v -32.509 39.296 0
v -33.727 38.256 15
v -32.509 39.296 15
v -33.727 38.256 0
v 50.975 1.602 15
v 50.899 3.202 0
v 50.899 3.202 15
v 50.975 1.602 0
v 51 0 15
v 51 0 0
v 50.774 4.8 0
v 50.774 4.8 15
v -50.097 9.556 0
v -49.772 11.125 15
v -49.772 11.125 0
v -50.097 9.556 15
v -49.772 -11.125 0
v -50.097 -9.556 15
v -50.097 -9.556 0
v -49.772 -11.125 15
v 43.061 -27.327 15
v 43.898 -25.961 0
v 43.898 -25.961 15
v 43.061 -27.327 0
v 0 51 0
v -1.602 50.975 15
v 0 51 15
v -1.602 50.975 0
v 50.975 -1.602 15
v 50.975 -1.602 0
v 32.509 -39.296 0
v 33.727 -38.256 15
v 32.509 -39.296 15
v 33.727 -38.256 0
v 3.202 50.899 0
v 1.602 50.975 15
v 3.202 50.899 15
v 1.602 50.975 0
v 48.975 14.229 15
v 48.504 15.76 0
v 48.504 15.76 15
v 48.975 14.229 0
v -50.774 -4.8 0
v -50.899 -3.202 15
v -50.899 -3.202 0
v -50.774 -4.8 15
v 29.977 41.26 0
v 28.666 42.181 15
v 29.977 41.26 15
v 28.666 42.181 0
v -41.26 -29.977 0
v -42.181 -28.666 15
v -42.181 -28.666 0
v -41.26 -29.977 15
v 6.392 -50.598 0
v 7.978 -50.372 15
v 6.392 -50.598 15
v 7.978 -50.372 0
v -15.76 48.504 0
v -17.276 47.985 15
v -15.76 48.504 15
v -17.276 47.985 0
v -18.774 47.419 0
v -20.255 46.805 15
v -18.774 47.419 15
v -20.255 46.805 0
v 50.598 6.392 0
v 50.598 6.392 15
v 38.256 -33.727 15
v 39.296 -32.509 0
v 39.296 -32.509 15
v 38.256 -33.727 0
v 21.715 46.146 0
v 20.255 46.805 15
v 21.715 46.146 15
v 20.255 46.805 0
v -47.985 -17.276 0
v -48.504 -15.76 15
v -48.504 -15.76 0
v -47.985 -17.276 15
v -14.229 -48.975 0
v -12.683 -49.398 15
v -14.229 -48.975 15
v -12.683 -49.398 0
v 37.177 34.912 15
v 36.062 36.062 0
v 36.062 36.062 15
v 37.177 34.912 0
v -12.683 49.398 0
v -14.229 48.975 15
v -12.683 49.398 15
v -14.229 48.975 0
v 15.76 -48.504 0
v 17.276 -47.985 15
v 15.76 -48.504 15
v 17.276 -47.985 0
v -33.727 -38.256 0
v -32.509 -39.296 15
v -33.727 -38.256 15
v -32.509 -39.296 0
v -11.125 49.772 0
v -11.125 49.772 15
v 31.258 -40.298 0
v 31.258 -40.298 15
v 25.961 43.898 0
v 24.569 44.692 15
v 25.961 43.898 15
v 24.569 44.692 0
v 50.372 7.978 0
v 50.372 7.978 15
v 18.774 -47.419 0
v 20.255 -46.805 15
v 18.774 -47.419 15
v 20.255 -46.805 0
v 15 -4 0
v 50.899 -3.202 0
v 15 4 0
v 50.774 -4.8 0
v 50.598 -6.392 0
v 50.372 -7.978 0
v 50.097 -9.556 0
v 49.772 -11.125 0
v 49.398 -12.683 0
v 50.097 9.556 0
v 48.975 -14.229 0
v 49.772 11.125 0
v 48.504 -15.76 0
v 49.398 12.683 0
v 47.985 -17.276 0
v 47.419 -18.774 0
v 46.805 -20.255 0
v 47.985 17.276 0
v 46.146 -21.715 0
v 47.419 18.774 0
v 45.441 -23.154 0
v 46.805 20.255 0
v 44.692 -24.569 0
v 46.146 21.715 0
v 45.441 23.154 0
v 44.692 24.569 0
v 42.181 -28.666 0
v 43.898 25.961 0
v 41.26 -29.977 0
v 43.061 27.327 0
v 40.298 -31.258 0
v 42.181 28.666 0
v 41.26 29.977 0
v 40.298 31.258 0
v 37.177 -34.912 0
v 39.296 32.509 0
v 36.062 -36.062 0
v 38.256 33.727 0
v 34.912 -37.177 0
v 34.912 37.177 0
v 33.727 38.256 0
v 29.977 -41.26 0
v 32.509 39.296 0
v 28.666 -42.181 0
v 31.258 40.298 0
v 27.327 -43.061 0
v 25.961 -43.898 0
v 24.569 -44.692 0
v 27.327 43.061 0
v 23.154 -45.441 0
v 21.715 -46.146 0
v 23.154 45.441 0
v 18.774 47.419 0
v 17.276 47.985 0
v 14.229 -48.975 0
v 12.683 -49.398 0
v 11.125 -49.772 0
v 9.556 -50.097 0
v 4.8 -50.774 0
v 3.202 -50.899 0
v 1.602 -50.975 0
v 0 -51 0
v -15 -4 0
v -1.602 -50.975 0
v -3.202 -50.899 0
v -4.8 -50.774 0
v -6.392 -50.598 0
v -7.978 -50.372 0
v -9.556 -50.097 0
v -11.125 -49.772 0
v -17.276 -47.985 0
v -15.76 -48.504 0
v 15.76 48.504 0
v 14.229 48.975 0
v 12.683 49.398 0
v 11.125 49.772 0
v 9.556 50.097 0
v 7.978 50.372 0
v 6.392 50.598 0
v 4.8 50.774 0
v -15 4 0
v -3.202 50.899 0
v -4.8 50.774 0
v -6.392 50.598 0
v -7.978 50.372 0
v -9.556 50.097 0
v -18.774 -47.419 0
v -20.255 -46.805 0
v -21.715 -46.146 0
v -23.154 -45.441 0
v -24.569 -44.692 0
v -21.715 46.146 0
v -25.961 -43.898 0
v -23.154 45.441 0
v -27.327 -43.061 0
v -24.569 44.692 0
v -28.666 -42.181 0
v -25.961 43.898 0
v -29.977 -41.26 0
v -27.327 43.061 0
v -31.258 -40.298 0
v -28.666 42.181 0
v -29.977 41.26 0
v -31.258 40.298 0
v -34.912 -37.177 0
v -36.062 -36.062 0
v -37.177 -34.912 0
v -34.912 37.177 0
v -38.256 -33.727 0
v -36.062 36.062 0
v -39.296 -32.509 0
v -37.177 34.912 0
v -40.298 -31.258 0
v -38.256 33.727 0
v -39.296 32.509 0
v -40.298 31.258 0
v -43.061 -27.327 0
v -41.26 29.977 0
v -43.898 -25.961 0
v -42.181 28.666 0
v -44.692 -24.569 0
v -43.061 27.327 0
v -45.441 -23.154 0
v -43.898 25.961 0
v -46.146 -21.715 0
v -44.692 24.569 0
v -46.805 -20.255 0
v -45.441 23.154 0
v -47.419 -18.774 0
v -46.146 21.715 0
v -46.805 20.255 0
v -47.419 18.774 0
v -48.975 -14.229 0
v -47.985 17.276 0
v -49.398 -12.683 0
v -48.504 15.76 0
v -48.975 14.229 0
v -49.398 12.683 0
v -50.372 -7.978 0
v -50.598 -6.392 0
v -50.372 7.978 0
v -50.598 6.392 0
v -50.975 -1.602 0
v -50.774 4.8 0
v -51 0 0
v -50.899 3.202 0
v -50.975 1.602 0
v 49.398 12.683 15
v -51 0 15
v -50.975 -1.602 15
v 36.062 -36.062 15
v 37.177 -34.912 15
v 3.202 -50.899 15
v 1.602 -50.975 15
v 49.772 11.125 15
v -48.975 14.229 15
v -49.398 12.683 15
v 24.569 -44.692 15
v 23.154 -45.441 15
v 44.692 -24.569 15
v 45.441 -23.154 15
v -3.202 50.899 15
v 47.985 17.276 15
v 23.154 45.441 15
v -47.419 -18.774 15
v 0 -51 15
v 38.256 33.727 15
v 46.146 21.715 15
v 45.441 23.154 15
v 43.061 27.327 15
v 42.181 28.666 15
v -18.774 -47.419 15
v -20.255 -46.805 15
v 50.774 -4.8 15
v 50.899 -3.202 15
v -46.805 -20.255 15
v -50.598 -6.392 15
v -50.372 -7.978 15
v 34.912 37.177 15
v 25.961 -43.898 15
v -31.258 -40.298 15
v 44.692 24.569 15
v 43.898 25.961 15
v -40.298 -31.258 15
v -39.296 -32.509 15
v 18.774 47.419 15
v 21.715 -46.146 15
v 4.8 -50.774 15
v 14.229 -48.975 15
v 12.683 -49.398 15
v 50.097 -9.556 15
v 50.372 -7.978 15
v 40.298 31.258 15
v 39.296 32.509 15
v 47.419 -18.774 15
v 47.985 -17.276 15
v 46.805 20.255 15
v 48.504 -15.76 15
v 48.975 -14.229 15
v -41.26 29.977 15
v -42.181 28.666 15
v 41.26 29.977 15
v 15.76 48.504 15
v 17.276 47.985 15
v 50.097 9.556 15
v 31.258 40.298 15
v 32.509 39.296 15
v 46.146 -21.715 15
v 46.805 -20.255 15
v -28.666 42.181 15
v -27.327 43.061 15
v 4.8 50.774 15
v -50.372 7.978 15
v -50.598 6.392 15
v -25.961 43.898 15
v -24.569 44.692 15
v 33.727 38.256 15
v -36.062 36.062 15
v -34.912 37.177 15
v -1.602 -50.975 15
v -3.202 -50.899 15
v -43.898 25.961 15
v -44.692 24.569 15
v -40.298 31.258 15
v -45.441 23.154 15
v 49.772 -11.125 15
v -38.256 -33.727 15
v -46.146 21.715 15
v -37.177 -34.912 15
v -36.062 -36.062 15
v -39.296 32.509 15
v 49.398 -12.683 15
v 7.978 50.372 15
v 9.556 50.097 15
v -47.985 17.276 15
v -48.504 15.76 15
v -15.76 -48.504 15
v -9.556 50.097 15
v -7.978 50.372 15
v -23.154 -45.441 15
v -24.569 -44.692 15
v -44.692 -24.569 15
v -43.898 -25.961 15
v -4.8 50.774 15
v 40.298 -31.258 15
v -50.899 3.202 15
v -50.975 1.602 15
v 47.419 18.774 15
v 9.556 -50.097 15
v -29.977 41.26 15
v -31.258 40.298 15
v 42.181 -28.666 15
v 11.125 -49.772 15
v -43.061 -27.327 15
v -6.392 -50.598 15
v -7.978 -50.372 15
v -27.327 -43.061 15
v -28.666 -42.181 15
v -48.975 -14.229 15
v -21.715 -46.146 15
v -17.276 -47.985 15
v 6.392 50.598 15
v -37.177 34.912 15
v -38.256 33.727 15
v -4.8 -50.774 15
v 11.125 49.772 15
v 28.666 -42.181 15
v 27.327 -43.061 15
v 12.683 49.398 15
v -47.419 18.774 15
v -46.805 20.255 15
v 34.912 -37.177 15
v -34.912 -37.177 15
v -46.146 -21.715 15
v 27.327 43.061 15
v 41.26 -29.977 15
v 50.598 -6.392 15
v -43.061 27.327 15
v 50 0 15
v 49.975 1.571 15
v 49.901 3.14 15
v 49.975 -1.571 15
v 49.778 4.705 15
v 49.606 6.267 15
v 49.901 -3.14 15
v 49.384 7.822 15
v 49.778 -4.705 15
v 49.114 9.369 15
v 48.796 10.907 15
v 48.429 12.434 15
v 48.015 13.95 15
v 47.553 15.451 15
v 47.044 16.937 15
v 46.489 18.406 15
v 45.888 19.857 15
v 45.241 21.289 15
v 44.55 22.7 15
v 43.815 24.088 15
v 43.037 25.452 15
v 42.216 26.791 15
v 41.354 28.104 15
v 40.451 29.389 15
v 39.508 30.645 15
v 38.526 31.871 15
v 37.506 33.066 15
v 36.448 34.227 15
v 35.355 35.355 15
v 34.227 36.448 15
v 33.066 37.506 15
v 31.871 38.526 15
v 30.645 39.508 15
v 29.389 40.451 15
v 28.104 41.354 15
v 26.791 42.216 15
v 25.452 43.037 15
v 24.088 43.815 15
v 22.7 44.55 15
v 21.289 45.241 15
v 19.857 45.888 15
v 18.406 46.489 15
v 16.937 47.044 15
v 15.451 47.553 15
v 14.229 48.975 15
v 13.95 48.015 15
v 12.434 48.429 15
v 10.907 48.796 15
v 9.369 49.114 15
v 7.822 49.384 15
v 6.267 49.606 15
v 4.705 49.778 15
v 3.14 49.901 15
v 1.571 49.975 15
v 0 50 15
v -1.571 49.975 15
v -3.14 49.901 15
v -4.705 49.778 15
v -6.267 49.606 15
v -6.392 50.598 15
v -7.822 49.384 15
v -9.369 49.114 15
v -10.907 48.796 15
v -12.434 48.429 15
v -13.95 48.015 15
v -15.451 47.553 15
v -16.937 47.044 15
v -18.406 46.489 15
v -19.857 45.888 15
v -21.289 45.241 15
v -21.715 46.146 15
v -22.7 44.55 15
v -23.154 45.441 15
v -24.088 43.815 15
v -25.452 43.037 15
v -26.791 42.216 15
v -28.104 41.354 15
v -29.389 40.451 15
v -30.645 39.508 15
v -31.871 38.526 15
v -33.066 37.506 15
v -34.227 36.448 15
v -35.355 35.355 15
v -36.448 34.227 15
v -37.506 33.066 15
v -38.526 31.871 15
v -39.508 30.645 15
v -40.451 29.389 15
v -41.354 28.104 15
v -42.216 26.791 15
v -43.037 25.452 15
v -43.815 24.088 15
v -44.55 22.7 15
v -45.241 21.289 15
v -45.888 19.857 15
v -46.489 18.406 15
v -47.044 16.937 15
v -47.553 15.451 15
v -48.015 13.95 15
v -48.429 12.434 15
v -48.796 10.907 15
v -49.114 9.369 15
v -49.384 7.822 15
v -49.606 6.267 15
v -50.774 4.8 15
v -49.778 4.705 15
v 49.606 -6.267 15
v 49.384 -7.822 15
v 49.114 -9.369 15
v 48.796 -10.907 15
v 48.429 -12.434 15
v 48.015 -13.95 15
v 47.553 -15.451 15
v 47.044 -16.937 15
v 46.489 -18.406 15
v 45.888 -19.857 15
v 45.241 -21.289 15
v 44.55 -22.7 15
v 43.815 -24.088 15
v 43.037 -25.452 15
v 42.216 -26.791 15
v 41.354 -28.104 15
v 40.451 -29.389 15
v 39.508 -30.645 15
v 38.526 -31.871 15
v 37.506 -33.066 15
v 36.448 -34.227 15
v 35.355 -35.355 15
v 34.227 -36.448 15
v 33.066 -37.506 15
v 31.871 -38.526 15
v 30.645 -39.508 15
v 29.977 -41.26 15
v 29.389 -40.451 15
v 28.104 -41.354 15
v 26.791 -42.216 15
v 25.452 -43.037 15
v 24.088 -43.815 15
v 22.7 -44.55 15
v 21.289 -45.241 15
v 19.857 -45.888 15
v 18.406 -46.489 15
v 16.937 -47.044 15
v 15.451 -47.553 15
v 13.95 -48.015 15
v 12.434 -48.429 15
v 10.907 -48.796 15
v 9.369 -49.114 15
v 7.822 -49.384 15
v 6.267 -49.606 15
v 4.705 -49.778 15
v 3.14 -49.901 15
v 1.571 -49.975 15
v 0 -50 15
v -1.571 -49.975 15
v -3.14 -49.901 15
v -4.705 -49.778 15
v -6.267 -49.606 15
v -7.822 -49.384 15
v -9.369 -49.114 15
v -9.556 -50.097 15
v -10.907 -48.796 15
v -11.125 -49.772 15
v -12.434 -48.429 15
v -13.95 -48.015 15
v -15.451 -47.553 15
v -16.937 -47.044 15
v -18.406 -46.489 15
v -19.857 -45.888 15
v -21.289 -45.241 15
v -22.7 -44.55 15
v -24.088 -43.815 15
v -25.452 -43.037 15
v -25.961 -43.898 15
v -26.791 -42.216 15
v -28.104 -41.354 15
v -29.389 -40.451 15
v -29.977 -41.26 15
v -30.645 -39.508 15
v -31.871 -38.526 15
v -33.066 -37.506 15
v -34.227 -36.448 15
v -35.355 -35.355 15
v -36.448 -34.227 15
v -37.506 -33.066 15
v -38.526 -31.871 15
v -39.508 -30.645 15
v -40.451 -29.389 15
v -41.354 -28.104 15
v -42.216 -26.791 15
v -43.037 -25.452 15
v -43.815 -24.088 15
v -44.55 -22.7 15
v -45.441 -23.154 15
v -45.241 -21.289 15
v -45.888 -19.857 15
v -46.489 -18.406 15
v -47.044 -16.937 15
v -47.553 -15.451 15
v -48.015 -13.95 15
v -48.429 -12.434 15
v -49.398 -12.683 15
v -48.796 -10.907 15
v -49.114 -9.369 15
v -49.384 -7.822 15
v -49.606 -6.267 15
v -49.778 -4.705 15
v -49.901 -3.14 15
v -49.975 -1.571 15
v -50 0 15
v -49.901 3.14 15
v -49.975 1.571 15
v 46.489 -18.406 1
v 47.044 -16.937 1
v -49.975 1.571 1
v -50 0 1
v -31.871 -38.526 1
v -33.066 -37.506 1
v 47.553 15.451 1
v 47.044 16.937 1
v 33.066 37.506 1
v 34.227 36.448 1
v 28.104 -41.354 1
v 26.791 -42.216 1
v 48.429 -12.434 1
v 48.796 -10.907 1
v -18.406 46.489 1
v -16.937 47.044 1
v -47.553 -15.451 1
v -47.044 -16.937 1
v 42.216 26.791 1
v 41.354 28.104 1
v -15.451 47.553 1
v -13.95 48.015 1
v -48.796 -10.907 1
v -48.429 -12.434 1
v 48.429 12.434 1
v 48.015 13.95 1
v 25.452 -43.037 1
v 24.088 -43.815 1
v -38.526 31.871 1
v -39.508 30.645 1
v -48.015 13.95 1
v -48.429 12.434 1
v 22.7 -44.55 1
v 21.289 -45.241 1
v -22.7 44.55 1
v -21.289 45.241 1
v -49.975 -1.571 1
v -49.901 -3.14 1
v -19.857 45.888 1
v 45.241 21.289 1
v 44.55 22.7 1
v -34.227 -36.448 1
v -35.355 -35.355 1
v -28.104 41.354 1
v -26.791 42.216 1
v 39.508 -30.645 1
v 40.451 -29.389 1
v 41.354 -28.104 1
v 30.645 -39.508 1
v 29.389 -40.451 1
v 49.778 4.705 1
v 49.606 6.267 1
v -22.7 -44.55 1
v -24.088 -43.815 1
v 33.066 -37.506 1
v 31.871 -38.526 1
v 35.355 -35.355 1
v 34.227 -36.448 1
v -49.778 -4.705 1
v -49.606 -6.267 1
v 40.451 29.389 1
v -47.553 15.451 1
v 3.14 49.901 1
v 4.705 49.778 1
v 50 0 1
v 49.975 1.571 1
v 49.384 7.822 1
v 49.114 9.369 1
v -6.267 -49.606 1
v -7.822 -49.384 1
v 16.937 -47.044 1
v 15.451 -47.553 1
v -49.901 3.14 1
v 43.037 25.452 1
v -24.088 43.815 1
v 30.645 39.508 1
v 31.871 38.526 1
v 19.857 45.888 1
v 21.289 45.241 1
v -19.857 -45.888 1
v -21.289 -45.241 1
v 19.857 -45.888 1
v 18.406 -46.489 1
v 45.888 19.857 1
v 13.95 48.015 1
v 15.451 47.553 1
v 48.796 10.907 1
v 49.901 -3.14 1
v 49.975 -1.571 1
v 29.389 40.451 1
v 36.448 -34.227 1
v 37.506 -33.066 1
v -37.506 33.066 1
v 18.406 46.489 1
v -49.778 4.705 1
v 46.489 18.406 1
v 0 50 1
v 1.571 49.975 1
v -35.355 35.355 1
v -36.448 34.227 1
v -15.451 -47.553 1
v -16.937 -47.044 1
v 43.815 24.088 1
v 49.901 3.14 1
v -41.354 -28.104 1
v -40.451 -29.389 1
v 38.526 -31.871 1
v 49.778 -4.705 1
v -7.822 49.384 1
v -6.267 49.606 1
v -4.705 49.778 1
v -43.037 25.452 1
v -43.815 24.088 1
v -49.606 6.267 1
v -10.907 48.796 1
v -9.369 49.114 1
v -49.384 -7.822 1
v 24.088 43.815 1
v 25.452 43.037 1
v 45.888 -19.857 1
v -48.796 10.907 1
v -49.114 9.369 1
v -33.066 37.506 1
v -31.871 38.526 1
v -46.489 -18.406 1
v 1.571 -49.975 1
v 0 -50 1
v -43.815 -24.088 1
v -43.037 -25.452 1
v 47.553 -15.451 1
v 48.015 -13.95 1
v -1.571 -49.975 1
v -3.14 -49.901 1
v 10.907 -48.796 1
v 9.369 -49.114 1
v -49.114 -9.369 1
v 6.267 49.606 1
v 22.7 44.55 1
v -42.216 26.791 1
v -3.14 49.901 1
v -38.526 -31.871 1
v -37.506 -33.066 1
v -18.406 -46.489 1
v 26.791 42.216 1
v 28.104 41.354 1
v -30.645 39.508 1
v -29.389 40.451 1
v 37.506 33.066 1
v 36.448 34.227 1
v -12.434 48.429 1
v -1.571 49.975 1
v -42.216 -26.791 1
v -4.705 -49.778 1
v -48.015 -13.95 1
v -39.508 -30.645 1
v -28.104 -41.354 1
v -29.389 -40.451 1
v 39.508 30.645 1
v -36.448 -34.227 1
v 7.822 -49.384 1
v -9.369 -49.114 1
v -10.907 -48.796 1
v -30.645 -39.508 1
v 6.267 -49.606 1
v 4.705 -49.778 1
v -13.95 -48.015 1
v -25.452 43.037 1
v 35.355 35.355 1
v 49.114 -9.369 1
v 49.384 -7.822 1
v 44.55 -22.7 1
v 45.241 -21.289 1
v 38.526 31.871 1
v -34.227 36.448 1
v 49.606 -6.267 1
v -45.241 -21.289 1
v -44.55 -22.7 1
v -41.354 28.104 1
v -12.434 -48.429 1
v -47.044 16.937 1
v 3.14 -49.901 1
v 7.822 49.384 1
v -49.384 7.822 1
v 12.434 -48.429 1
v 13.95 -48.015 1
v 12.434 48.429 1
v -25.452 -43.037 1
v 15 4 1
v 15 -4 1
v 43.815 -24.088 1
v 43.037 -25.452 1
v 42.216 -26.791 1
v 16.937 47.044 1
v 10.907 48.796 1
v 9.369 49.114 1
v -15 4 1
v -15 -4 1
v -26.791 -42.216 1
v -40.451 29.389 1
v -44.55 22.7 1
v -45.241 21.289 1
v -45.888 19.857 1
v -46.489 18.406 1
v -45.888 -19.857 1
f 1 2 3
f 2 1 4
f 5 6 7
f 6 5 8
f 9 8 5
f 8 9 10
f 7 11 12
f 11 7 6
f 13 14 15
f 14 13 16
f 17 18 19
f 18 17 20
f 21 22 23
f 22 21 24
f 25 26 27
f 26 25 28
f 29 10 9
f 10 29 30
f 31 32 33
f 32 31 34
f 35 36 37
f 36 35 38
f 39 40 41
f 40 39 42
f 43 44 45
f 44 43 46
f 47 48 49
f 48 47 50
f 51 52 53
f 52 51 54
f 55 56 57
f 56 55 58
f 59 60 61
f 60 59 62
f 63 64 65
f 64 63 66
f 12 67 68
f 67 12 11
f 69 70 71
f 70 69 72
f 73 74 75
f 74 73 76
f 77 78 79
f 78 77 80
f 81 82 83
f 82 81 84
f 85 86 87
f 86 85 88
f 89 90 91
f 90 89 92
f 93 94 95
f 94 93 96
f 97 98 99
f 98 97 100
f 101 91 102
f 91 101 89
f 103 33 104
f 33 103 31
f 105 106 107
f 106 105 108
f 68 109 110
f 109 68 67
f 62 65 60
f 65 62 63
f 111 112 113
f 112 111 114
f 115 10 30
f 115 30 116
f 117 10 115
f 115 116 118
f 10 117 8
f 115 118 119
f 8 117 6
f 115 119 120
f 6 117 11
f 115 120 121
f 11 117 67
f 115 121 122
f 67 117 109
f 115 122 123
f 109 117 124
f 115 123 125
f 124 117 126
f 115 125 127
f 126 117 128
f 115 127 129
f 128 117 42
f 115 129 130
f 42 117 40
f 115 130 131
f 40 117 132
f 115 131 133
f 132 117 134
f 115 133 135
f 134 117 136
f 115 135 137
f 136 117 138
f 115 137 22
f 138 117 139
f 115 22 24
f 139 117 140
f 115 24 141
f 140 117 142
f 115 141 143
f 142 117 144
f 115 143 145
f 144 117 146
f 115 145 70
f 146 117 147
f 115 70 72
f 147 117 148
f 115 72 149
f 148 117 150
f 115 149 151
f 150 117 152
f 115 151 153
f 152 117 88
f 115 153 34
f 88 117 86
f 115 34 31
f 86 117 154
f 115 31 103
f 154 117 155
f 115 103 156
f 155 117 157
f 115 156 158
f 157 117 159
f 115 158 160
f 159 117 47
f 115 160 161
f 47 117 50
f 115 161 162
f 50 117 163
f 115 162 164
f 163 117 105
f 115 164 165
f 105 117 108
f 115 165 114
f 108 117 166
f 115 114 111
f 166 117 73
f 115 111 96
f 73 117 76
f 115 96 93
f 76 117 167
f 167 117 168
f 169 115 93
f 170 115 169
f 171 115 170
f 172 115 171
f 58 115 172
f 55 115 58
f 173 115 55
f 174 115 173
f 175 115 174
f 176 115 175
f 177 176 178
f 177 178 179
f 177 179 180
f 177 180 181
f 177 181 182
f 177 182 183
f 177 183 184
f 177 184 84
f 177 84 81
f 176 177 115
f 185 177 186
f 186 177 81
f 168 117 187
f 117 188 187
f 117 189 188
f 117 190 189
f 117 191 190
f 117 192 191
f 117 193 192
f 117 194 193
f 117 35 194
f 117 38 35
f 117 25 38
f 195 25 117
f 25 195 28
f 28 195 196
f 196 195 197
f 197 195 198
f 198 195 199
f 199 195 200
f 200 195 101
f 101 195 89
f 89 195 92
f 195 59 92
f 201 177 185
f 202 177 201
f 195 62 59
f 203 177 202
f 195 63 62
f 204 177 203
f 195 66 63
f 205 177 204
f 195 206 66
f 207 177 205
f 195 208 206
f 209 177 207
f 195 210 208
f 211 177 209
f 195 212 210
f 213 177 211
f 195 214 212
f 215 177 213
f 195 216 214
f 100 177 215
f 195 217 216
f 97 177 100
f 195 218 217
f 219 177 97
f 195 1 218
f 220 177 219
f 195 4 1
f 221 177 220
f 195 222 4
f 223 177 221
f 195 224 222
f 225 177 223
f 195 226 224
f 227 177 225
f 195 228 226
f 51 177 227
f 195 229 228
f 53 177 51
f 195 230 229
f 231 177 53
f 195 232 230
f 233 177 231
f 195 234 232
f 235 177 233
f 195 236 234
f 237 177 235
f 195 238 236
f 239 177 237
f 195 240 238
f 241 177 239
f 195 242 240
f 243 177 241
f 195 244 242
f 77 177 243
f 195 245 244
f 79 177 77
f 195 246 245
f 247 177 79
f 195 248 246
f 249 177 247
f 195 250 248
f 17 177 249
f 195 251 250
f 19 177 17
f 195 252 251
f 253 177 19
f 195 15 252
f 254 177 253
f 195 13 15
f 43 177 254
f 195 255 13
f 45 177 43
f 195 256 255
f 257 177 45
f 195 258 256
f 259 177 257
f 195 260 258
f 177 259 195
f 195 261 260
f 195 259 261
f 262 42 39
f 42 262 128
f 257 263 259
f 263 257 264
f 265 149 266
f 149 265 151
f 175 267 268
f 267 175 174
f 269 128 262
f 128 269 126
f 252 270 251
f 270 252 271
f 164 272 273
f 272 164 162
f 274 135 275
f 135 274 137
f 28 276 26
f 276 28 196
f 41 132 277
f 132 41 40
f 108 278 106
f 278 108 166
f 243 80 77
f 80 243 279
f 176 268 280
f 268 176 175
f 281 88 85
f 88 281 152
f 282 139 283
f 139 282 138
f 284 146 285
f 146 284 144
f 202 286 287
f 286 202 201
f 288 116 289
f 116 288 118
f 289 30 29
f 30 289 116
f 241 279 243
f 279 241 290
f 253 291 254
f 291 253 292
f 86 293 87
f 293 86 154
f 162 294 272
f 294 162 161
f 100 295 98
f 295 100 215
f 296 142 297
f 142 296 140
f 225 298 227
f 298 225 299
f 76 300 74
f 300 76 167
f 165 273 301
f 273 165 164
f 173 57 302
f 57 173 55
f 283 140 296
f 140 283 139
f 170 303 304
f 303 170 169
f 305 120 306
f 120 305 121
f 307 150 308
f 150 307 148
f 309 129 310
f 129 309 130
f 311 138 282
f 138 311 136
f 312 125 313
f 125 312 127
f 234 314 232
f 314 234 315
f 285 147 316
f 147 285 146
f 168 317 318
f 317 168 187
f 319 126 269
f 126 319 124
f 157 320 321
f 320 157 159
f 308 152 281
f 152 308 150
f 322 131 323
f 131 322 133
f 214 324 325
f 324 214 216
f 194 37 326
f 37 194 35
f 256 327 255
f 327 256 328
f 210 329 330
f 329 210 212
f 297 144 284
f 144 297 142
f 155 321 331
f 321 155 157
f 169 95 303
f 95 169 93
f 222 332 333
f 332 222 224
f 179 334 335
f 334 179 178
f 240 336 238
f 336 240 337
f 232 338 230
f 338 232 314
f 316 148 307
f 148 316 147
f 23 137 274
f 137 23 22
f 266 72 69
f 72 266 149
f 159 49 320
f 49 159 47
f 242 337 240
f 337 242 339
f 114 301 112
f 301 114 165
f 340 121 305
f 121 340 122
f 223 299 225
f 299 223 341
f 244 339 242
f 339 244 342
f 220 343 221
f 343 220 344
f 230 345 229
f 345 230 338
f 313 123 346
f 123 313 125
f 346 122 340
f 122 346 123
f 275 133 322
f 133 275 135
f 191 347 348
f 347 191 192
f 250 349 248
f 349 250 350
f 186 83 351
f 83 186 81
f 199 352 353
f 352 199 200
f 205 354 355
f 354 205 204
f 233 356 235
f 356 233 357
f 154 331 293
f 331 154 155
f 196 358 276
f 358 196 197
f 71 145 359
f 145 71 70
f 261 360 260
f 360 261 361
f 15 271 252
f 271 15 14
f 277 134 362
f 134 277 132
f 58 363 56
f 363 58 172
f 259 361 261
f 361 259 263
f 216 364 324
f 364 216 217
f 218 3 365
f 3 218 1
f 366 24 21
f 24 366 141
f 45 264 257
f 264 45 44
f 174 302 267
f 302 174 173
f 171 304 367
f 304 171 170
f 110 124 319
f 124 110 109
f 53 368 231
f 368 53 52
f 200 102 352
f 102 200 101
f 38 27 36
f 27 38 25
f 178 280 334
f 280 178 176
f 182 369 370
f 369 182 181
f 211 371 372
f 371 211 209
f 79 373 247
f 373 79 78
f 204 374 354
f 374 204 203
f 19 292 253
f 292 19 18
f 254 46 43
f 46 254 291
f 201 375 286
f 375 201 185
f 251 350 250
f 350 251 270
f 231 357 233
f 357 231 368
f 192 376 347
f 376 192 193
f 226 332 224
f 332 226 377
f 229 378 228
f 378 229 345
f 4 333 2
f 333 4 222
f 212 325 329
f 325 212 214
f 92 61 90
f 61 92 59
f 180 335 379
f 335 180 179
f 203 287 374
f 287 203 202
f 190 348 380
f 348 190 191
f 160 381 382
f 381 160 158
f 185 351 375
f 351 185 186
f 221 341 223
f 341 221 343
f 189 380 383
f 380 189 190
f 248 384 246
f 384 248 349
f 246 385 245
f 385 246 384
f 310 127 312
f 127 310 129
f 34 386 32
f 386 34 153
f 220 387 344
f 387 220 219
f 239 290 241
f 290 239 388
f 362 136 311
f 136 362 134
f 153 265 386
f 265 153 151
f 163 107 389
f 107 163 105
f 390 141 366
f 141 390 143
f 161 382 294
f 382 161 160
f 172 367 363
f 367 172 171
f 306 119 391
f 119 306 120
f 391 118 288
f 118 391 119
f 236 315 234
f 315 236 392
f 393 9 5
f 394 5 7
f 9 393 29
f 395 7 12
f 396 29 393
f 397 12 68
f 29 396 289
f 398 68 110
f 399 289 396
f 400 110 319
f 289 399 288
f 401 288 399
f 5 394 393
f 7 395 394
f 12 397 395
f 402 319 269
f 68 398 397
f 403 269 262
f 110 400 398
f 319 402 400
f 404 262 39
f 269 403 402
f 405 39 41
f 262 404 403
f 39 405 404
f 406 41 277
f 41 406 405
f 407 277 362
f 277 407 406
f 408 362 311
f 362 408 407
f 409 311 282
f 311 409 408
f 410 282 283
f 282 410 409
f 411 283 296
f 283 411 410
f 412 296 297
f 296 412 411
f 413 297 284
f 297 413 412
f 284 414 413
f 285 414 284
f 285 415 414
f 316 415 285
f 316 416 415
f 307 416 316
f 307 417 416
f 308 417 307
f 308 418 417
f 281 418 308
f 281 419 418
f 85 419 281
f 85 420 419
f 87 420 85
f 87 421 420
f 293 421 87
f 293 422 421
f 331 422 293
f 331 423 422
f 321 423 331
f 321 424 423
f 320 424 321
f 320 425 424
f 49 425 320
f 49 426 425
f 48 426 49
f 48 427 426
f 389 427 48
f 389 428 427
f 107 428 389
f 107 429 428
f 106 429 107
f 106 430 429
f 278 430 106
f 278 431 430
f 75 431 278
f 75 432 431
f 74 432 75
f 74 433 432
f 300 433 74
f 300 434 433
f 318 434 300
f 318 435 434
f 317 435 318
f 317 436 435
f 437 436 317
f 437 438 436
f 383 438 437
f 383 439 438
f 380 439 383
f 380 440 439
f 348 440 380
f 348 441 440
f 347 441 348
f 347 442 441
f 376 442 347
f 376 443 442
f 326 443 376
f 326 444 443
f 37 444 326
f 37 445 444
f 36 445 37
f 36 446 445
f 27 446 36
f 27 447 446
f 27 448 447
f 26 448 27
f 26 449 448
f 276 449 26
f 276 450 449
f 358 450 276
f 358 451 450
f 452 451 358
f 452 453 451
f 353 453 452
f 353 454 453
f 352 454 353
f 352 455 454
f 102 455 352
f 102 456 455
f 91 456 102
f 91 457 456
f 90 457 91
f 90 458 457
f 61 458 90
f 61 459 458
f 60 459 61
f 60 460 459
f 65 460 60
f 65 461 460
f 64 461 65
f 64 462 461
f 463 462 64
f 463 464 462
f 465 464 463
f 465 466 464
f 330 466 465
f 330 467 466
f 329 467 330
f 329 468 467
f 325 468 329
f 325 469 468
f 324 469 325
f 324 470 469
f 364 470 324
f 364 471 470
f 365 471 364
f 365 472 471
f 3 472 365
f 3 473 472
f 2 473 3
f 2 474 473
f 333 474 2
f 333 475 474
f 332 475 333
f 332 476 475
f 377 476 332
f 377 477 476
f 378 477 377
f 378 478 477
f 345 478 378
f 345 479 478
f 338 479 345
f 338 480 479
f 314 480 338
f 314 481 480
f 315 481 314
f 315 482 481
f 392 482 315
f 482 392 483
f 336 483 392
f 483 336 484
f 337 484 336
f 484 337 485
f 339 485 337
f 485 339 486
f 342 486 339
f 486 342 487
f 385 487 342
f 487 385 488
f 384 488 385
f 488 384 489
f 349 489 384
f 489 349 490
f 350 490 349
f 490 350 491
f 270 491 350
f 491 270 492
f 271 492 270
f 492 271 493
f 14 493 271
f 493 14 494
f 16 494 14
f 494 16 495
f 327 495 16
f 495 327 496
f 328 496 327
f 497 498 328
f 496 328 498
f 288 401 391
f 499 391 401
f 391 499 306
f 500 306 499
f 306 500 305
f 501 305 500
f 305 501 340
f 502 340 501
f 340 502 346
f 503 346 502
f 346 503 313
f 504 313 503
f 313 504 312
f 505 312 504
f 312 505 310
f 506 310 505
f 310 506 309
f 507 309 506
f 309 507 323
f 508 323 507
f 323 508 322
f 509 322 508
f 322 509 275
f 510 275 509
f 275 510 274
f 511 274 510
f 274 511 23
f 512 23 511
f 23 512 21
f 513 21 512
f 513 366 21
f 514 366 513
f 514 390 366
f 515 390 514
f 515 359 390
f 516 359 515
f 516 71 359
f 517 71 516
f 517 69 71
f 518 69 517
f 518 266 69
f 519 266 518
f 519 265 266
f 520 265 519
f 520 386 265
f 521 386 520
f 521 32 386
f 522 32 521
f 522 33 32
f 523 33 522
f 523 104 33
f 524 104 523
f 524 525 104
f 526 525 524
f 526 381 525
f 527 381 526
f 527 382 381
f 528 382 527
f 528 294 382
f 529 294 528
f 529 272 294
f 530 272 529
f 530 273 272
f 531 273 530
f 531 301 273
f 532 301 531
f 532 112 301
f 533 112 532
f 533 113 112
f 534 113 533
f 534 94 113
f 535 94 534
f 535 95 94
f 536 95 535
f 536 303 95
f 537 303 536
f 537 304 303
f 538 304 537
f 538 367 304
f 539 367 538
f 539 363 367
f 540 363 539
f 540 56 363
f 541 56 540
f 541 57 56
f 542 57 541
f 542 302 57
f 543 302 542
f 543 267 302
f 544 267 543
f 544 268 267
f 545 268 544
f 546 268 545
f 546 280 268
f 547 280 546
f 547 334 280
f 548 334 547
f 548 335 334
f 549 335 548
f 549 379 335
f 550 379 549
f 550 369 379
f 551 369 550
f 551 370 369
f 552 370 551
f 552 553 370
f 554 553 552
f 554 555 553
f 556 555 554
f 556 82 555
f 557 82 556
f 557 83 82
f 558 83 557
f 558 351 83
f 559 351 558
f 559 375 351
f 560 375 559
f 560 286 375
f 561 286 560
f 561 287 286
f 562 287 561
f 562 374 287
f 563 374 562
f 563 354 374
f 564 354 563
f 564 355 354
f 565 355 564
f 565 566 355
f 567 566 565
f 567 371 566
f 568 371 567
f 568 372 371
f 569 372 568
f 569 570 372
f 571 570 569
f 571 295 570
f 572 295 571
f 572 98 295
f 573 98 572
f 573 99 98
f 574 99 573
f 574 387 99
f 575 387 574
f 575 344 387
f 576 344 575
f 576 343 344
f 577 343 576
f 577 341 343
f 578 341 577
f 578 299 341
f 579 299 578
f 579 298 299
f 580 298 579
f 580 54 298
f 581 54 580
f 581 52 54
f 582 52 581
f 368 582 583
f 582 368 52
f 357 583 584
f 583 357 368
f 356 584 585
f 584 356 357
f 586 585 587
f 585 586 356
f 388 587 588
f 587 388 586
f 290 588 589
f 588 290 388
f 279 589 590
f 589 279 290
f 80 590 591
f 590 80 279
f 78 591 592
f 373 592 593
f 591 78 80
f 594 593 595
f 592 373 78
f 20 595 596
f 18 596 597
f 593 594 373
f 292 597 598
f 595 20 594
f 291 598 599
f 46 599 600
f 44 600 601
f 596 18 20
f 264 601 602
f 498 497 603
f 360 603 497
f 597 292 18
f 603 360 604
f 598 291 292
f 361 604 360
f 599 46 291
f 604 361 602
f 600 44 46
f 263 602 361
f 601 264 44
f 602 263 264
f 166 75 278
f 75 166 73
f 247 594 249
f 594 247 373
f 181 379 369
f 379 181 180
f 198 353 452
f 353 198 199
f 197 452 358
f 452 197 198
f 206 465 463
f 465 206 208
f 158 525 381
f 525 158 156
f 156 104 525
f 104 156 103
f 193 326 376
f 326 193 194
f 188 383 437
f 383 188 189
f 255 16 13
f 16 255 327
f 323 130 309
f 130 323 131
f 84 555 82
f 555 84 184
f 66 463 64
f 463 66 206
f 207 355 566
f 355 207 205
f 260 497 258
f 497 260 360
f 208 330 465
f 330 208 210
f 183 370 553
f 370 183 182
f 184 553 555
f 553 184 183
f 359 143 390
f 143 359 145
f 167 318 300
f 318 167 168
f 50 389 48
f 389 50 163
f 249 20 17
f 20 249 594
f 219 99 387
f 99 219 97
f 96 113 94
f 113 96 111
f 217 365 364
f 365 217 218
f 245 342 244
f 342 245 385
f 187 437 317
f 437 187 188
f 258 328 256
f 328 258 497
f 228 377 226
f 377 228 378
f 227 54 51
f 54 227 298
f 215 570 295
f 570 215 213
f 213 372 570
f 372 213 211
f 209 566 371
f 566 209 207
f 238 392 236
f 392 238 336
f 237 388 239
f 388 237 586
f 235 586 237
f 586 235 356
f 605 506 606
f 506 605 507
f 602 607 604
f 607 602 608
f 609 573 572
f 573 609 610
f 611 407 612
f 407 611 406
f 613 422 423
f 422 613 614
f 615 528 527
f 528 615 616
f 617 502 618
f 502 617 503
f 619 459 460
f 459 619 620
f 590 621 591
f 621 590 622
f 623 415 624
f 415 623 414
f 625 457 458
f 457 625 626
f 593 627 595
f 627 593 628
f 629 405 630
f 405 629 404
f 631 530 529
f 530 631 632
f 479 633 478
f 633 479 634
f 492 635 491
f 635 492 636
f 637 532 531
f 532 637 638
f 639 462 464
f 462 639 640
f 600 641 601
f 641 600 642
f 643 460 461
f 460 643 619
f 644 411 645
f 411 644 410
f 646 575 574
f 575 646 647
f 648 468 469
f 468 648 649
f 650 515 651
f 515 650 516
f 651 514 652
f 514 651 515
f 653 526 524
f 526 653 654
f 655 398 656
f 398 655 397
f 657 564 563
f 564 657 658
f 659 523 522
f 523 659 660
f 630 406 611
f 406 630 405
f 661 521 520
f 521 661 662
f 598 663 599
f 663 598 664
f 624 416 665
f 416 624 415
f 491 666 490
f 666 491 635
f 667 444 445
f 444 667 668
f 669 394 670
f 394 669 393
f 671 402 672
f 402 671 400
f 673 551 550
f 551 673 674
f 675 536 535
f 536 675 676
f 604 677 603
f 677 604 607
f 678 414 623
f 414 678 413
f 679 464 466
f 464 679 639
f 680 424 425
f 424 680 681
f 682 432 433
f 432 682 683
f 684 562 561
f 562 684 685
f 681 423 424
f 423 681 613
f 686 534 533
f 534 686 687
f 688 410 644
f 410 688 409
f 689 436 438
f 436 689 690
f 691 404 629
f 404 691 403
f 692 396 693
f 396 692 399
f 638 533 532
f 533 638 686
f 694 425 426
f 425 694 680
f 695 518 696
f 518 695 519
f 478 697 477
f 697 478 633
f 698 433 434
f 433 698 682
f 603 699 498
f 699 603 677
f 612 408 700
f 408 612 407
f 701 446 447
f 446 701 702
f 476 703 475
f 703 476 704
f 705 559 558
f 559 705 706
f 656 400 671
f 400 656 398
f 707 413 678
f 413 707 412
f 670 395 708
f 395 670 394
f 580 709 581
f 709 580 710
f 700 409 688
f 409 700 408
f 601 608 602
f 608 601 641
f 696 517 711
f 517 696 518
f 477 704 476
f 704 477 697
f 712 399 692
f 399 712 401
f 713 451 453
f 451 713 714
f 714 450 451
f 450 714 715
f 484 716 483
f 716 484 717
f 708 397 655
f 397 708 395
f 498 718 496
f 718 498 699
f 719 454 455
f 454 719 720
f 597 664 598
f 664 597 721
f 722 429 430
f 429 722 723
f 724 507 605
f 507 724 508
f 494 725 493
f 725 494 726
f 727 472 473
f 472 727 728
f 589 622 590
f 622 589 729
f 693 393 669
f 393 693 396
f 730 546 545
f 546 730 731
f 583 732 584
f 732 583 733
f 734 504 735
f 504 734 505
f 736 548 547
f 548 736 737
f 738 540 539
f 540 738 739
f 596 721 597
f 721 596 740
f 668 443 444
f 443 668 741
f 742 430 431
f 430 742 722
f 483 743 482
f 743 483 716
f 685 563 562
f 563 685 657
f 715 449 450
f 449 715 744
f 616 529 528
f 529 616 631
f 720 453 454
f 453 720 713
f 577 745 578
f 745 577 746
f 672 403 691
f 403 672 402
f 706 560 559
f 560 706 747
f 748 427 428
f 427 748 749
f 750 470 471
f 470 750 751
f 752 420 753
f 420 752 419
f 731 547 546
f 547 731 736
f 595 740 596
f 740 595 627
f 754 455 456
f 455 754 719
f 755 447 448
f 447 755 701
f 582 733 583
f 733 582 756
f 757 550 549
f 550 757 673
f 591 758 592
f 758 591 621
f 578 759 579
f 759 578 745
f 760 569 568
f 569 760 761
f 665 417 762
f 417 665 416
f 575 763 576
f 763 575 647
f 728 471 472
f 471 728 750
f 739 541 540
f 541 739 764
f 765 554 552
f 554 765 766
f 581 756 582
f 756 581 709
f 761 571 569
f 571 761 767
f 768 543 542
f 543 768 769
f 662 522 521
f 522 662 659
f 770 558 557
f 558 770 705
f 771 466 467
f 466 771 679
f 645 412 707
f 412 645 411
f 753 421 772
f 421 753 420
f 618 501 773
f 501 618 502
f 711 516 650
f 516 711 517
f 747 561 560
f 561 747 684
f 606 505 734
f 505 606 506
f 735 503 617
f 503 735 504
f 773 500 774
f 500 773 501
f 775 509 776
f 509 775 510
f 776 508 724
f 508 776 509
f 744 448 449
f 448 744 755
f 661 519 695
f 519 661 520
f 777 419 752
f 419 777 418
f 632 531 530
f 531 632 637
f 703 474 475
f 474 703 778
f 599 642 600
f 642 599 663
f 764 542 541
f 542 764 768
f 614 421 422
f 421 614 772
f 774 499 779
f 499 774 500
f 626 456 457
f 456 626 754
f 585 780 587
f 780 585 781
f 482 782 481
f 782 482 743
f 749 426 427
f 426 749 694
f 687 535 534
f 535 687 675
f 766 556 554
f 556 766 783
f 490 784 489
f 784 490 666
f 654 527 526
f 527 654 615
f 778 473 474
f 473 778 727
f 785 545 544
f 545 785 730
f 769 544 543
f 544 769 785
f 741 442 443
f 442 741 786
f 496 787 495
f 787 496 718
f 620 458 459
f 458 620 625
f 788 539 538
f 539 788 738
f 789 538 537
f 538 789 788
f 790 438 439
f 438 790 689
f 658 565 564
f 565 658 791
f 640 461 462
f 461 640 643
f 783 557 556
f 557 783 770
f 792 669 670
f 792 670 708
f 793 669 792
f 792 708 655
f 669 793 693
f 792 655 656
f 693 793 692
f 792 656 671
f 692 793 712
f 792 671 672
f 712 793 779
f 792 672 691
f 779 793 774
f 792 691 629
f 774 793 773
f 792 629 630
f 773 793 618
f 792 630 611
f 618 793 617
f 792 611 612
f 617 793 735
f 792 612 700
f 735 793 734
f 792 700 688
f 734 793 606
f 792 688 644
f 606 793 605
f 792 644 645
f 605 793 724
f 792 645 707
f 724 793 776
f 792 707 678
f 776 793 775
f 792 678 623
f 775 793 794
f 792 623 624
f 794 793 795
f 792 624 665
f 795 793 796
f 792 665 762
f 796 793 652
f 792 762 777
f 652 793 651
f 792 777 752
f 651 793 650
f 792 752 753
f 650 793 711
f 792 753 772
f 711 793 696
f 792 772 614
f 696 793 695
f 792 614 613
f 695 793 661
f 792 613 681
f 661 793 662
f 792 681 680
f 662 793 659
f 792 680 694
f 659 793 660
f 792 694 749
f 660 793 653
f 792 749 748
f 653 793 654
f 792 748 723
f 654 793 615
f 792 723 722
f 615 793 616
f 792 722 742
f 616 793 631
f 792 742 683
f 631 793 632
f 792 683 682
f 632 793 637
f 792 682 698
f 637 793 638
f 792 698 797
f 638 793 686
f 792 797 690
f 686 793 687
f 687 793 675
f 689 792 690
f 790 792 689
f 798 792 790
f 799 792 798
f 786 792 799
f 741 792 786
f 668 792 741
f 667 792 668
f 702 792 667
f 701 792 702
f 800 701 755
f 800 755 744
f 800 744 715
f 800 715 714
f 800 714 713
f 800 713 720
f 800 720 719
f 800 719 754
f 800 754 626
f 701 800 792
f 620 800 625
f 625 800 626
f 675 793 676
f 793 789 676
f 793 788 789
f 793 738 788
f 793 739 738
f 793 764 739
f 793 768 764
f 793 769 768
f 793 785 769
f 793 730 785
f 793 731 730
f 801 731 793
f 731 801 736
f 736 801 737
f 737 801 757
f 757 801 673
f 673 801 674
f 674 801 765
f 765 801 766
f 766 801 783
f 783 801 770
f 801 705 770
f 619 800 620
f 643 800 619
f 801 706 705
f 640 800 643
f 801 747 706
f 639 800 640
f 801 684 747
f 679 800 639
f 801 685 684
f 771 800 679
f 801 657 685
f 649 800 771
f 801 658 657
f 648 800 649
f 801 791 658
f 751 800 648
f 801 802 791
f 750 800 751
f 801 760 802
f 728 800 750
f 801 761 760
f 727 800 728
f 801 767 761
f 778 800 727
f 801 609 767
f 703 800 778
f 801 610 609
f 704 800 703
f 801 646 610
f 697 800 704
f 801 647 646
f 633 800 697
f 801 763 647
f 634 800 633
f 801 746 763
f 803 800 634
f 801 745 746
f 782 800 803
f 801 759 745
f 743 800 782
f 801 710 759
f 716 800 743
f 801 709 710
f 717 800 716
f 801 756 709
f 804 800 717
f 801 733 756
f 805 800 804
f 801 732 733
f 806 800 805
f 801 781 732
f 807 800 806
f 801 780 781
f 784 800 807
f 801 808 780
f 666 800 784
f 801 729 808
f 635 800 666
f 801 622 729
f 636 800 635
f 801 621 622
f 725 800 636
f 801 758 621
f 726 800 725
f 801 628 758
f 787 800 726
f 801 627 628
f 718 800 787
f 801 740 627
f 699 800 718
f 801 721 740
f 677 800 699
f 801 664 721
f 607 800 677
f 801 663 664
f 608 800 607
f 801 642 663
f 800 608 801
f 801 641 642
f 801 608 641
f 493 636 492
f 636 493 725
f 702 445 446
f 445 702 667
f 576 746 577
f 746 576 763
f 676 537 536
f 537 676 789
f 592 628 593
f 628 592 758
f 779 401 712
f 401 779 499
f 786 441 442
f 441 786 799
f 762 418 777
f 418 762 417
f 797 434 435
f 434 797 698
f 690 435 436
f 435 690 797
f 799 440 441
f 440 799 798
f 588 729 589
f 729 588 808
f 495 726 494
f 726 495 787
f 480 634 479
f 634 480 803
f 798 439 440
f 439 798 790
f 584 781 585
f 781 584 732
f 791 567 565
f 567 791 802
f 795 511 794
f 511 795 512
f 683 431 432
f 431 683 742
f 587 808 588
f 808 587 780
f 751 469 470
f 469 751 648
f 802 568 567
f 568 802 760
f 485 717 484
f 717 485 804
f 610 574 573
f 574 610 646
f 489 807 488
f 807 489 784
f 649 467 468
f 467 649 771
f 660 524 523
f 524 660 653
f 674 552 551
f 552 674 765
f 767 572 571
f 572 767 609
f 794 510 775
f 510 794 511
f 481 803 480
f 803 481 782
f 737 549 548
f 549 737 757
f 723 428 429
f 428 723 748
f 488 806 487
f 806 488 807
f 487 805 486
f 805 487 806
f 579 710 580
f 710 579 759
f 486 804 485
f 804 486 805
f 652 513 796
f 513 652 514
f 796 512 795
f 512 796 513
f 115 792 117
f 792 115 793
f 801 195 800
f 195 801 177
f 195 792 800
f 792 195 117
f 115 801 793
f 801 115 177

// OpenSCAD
// A simple lid for a can that I have, with a slot for aluminium can tabs

dia = 100;
wall_thicc = 1;
$fn=200;
difference() {
    cylinder(15, dia/2+wall_thicc, dia/2+wall_thicc);
    translate([0, 0, wall_thicc])
        cylinder(15, dia/2, dia/2);
    cube([30, 8, 5], center=true);
}
